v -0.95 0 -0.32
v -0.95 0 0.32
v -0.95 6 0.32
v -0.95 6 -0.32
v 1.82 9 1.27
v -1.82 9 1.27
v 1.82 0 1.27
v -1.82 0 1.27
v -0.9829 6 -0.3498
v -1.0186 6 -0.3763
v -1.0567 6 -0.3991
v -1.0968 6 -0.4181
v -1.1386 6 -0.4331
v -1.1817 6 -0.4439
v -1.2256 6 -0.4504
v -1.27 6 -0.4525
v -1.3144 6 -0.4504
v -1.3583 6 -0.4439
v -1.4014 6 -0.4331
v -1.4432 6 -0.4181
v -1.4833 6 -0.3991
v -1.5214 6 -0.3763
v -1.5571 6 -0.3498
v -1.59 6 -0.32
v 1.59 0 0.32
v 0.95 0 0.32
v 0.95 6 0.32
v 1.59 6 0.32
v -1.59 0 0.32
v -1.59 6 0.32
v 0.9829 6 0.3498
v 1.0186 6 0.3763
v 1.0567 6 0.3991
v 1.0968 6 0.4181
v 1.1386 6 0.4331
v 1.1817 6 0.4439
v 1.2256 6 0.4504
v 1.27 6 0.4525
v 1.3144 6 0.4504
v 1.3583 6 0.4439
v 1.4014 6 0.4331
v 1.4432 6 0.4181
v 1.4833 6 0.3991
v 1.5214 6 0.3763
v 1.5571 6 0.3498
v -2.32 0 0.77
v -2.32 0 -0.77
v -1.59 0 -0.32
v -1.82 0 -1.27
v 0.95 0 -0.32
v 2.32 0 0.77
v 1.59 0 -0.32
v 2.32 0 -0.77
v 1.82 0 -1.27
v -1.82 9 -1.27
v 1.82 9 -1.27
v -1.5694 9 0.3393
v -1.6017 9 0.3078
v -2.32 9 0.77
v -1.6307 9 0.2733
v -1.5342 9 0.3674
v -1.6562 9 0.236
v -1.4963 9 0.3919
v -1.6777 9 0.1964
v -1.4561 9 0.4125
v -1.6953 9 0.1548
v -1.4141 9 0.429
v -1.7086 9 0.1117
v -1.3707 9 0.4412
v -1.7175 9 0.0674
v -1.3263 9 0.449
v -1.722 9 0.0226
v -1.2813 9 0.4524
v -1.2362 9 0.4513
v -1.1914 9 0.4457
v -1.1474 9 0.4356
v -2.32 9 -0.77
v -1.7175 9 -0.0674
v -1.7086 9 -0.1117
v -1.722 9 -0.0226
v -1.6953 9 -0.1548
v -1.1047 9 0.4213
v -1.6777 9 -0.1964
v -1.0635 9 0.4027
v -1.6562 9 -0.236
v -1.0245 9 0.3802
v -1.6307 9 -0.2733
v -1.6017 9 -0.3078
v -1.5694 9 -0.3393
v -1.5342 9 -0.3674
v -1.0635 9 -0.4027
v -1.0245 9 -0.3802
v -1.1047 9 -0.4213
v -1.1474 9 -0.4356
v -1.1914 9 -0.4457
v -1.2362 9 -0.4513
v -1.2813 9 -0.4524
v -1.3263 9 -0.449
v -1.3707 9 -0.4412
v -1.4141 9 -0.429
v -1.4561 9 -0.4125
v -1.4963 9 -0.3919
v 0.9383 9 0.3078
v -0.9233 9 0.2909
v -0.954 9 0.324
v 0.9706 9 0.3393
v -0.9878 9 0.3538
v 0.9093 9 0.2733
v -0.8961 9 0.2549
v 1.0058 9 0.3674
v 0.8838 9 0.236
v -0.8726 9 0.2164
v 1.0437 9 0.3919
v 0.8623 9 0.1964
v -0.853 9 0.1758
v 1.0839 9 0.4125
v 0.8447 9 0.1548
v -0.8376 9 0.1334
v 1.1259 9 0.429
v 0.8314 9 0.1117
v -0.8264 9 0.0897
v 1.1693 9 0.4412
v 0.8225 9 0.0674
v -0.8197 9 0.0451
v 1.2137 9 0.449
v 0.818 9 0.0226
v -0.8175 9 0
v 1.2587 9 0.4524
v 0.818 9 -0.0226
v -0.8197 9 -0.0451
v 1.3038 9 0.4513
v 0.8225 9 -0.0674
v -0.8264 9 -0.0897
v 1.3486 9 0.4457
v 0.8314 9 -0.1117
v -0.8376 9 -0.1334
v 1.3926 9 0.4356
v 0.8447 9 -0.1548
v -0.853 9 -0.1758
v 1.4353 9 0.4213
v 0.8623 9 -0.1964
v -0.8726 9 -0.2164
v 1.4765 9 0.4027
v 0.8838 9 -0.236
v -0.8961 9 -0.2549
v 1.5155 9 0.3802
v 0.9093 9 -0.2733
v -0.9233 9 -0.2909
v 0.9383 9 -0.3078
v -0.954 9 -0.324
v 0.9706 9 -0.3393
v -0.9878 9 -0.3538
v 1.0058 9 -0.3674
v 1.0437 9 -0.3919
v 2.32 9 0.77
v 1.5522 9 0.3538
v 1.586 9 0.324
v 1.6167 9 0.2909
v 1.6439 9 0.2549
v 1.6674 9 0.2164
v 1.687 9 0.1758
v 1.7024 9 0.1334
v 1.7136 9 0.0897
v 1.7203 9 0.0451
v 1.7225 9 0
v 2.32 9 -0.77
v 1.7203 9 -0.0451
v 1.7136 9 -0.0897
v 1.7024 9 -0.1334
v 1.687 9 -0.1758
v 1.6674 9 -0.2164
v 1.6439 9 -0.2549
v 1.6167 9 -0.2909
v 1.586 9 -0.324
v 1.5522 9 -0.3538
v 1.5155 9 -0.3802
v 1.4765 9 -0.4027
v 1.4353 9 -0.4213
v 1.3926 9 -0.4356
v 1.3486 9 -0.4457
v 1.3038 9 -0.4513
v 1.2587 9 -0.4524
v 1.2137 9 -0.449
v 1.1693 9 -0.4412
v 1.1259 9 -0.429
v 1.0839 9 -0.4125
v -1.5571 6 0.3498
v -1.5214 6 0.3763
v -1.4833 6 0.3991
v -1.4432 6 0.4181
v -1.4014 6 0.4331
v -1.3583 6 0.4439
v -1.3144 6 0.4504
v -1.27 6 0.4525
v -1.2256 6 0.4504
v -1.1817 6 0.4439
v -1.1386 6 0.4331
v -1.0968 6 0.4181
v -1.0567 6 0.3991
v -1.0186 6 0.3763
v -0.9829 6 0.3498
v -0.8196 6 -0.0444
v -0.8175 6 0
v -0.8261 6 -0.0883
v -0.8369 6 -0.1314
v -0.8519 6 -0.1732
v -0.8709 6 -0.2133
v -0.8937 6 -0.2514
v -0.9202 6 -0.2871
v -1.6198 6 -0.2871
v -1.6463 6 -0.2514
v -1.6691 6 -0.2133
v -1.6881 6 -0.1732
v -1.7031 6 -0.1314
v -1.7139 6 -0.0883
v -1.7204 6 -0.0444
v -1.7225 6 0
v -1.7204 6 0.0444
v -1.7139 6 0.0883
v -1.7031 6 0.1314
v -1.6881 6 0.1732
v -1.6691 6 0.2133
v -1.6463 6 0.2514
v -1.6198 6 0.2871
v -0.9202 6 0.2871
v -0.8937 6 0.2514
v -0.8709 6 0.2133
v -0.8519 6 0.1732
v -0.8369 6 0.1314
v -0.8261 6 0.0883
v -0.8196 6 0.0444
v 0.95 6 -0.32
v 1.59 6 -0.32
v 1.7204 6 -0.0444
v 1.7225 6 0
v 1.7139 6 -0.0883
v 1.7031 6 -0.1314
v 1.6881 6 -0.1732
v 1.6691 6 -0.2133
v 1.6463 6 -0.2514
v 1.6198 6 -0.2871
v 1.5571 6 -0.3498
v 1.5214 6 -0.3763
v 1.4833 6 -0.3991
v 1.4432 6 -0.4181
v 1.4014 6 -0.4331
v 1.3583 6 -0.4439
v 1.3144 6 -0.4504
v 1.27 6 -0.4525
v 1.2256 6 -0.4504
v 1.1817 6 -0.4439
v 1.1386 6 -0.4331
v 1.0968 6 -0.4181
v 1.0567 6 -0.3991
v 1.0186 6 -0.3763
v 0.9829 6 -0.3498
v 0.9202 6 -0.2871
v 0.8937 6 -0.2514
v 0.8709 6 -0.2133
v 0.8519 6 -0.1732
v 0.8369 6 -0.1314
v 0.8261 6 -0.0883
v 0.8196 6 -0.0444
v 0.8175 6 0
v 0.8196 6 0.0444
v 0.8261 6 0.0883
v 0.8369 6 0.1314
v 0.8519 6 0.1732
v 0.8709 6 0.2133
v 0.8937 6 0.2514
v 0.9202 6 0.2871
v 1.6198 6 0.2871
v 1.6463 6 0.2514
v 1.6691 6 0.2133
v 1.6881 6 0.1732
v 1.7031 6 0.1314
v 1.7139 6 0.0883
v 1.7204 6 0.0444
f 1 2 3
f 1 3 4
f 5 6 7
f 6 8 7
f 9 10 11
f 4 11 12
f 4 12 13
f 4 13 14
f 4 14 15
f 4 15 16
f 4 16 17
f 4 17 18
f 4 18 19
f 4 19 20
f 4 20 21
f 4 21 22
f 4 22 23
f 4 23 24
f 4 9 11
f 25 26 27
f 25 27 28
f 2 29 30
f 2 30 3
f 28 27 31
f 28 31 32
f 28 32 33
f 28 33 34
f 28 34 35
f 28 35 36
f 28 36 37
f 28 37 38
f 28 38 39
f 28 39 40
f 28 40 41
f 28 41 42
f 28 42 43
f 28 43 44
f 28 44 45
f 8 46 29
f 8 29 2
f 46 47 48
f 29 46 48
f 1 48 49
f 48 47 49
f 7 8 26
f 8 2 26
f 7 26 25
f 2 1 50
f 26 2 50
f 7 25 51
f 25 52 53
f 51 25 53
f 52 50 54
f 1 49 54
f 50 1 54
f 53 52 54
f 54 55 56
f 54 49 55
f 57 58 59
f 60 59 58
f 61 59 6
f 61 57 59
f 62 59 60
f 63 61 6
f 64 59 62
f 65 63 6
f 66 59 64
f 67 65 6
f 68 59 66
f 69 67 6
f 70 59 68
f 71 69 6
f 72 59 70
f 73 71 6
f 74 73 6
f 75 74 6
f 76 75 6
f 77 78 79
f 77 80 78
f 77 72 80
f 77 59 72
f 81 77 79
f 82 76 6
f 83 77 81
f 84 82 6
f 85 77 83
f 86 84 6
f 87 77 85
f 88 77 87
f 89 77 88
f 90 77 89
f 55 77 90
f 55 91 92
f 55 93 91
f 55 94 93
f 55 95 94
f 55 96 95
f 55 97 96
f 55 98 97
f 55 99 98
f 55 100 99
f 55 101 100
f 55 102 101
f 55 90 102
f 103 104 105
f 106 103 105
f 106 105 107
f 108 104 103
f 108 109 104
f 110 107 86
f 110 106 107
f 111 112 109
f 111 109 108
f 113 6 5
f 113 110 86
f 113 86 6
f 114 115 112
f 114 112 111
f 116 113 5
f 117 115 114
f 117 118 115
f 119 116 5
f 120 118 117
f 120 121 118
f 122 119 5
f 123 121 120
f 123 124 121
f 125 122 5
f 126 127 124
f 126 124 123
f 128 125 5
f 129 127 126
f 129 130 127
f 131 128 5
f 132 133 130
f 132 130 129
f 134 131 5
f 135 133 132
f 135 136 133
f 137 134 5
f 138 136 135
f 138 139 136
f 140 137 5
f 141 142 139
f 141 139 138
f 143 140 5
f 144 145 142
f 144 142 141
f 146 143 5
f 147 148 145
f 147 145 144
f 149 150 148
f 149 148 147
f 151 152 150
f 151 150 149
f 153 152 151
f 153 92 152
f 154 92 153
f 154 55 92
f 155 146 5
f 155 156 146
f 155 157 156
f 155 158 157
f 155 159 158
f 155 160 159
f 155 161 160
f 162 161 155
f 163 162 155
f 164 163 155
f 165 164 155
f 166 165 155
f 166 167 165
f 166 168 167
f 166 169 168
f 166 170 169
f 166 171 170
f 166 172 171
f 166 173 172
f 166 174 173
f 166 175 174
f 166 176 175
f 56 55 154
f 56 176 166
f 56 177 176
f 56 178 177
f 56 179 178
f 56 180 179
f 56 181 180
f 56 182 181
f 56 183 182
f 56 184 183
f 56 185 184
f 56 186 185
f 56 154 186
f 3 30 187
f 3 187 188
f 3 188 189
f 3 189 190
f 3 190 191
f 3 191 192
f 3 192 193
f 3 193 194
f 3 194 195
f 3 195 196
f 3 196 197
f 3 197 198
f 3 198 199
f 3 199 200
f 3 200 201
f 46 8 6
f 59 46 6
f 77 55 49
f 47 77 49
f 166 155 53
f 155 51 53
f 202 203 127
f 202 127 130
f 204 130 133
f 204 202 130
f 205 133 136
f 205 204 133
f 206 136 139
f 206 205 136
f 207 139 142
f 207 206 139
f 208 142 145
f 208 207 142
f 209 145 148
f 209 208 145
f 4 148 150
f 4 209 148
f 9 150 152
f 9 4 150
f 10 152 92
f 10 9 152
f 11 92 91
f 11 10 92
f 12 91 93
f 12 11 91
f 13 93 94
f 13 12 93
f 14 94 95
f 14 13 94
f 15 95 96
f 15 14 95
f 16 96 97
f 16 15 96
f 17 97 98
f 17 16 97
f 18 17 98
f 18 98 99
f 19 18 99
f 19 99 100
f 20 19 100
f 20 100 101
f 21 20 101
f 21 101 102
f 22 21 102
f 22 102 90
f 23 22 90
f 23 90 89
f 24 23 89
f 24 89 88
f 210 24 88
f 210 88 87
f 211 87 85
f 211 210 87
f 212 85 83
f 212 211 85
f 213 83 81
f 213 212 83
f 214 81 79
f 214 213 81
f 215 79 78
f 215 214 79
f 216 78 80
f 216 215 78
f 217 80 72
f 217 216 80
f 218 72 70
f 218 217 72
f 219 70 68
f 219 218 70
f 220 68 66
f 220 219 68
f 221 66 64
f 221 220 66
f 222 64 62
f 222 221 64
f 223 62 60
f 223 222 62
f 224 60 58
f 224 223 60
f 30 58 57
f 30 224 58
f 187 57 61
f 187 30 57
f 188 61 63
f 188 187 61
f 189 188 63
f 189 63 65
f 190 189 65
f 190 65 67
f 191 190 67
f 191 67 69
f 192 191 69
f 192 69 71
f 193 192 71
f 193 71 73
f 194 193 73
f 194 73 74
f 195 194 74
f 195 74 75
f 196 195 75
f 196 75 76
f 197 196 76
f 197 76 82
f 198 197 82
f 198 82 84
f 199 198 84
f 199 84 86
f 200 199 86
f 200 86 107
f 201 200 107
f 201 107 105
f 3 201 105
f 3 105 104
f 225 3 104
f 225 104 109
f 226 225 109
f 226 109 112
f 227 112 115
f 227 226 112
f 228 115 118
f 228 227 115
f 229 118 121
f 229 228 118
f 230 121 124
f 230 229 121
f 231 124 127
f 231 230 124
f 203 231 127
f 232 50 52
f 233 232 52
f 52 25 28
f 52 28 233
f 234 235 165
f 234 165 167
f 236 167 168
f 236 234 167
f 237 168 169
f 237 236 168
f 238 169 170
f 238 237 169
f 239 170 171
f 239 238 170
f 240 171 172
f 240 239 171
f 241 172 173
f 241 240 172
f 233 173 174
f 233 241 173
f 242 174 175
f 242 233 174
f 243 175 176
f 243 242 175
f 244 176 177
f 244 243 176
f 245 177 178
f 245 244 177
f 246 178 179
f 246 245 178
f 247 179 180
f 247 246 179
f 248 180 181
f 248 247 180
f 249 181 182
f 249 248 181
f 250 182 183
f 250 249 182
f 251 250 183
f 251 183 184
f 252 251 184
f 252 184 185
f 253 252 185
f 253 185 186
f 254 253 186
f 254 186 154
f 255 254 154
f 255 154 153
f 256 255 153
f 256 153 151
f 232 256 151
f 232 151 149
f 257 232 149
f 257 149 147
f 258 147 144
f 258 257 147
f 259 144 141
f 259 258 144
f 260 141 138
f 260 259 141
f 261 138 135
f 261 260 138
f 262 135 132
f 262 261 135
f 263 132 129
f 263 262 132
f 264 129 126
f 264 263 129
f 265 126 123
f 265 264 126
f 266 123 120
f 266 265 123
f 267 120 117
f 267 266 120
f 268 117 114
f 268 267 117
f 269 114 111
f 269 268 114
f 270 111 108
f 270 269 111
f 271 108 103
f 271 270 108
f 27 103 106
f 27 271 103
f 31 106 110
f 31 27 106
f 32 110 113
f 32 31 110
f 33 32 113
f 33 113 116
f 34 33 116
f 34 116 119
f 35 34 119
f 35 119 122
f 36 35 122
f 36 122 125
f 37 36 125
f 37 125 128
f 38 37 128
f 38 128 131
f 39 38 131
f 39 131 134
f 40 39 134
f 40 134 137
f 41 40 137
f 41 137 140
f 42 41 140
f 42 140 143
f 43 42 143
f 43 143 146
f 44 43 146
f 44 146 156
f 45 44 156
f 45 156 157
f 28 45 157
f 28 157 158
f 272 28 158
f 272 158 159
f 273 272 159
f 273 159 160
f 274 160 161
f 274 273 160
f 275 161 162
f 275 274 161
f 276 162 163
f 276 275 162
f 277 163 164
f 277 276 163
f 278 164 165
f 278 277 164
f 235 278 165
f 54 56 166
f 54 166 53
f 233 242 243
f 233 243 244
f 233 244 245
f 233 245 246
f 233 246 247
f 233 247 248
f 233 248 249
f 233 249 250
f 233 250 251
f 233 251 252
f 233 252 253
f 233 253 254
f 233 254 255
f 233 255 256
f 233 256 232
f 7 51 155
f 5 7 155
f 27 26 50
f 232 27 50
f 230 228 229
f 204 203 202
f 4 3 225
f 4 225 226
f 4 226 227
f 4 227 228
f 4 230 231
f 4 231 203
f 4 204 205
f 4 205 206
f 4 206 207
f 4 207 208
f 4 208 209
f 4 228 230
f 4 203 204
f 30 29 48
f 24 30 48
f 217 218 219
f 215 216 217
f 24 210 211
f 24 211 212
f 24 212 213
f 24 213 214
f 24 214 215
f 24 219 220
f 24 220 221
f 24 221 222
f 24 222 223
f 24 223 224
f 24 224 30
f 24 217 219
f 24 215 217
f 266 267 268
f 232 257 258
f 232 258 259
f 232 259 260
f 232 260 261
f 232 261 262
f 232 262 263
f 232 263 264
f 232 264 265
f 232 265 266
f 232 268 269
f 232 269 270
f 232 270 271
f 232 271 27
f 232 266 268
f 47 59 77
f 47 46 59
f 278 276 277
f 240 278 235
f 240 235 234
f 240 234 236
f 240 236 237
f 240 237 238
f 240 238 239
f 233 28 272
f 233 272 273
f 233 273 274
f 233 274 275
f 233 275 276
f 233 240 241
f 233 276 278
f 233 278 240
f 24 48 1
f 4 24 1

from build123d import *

# Parameters (mm, degrees)
SKETCH_1_W      = 4.64
SKETCH_1_H      = 2.54
SKETCH_1_W_2    = 0.64
SKETCH_1_H_2    = 0.64
EXTRUDE_1_DEPTH = 6
SKETCH_2_W      = 4.64
SKETCH_2_H      = 2.54
SKETCH_2_R      = 0.45254834
EXTRUDE_2_DEPTH = 3
CHAMFER_1_SIZE  = 0.5


with BuildPart() as part:
    # Эскиз1 → Бобышка-Вытянуть1 (new body)
    with BuildSketch(Plane(origin=(0, 0, 0), x_dir=(1, 0, 0), z_dir=(0, 1, 0))):
        Rectangle(SKETCH_1_W, SKETCH_1_H)
        with Locations((-1.27, 0)):
            Rectangle(SKETCH_1_W_2, SKETCH_1_H_2, mode=Mode.SUBTRACT)
        with Locations((1.27, 0)):
            Rectangle(SKETCH_1_W_2, SKETCH_1_H_2, mode=Mode.SUBTRACT)
    extrude(amount=EXTRUDE_1_DEPTH)

    # Эскиз2 → Бобышка-Вытянуть2 (add)
    with BuildSketch(Plane(origin=(0, 6, 0), x_dir=(1, 0, 0), z_dir=(0, 1, 0))):
        Rectangle(SKETCH_2_W, SKETCH_2_H)
        with Locations((-1.27, 0)):
            Circle(SKETCH_2_R, mode=Mode.SUBTRACT)
        with Locations((1.27, 0)):
            Circle(SKETCH_2_R, mode=Mode.SUBTRACT)
    extrude(amount=EXTRUDE_2_DEPTH)

    # Фаска1
    chamfer_1_edges = [part.edges().sort_by_distance(p)[0] for p in [
        (2.32, 4.5, 1.27),
        (-2.32, 4.5, 1.27),
        (-2.32, 4.5, -1.27),
        (2.32, 4.5, -1.27),
    ]]
    chamfer(chamfer_1_edges, length=CHAMFER_1_SIZE)


solid = part.part
